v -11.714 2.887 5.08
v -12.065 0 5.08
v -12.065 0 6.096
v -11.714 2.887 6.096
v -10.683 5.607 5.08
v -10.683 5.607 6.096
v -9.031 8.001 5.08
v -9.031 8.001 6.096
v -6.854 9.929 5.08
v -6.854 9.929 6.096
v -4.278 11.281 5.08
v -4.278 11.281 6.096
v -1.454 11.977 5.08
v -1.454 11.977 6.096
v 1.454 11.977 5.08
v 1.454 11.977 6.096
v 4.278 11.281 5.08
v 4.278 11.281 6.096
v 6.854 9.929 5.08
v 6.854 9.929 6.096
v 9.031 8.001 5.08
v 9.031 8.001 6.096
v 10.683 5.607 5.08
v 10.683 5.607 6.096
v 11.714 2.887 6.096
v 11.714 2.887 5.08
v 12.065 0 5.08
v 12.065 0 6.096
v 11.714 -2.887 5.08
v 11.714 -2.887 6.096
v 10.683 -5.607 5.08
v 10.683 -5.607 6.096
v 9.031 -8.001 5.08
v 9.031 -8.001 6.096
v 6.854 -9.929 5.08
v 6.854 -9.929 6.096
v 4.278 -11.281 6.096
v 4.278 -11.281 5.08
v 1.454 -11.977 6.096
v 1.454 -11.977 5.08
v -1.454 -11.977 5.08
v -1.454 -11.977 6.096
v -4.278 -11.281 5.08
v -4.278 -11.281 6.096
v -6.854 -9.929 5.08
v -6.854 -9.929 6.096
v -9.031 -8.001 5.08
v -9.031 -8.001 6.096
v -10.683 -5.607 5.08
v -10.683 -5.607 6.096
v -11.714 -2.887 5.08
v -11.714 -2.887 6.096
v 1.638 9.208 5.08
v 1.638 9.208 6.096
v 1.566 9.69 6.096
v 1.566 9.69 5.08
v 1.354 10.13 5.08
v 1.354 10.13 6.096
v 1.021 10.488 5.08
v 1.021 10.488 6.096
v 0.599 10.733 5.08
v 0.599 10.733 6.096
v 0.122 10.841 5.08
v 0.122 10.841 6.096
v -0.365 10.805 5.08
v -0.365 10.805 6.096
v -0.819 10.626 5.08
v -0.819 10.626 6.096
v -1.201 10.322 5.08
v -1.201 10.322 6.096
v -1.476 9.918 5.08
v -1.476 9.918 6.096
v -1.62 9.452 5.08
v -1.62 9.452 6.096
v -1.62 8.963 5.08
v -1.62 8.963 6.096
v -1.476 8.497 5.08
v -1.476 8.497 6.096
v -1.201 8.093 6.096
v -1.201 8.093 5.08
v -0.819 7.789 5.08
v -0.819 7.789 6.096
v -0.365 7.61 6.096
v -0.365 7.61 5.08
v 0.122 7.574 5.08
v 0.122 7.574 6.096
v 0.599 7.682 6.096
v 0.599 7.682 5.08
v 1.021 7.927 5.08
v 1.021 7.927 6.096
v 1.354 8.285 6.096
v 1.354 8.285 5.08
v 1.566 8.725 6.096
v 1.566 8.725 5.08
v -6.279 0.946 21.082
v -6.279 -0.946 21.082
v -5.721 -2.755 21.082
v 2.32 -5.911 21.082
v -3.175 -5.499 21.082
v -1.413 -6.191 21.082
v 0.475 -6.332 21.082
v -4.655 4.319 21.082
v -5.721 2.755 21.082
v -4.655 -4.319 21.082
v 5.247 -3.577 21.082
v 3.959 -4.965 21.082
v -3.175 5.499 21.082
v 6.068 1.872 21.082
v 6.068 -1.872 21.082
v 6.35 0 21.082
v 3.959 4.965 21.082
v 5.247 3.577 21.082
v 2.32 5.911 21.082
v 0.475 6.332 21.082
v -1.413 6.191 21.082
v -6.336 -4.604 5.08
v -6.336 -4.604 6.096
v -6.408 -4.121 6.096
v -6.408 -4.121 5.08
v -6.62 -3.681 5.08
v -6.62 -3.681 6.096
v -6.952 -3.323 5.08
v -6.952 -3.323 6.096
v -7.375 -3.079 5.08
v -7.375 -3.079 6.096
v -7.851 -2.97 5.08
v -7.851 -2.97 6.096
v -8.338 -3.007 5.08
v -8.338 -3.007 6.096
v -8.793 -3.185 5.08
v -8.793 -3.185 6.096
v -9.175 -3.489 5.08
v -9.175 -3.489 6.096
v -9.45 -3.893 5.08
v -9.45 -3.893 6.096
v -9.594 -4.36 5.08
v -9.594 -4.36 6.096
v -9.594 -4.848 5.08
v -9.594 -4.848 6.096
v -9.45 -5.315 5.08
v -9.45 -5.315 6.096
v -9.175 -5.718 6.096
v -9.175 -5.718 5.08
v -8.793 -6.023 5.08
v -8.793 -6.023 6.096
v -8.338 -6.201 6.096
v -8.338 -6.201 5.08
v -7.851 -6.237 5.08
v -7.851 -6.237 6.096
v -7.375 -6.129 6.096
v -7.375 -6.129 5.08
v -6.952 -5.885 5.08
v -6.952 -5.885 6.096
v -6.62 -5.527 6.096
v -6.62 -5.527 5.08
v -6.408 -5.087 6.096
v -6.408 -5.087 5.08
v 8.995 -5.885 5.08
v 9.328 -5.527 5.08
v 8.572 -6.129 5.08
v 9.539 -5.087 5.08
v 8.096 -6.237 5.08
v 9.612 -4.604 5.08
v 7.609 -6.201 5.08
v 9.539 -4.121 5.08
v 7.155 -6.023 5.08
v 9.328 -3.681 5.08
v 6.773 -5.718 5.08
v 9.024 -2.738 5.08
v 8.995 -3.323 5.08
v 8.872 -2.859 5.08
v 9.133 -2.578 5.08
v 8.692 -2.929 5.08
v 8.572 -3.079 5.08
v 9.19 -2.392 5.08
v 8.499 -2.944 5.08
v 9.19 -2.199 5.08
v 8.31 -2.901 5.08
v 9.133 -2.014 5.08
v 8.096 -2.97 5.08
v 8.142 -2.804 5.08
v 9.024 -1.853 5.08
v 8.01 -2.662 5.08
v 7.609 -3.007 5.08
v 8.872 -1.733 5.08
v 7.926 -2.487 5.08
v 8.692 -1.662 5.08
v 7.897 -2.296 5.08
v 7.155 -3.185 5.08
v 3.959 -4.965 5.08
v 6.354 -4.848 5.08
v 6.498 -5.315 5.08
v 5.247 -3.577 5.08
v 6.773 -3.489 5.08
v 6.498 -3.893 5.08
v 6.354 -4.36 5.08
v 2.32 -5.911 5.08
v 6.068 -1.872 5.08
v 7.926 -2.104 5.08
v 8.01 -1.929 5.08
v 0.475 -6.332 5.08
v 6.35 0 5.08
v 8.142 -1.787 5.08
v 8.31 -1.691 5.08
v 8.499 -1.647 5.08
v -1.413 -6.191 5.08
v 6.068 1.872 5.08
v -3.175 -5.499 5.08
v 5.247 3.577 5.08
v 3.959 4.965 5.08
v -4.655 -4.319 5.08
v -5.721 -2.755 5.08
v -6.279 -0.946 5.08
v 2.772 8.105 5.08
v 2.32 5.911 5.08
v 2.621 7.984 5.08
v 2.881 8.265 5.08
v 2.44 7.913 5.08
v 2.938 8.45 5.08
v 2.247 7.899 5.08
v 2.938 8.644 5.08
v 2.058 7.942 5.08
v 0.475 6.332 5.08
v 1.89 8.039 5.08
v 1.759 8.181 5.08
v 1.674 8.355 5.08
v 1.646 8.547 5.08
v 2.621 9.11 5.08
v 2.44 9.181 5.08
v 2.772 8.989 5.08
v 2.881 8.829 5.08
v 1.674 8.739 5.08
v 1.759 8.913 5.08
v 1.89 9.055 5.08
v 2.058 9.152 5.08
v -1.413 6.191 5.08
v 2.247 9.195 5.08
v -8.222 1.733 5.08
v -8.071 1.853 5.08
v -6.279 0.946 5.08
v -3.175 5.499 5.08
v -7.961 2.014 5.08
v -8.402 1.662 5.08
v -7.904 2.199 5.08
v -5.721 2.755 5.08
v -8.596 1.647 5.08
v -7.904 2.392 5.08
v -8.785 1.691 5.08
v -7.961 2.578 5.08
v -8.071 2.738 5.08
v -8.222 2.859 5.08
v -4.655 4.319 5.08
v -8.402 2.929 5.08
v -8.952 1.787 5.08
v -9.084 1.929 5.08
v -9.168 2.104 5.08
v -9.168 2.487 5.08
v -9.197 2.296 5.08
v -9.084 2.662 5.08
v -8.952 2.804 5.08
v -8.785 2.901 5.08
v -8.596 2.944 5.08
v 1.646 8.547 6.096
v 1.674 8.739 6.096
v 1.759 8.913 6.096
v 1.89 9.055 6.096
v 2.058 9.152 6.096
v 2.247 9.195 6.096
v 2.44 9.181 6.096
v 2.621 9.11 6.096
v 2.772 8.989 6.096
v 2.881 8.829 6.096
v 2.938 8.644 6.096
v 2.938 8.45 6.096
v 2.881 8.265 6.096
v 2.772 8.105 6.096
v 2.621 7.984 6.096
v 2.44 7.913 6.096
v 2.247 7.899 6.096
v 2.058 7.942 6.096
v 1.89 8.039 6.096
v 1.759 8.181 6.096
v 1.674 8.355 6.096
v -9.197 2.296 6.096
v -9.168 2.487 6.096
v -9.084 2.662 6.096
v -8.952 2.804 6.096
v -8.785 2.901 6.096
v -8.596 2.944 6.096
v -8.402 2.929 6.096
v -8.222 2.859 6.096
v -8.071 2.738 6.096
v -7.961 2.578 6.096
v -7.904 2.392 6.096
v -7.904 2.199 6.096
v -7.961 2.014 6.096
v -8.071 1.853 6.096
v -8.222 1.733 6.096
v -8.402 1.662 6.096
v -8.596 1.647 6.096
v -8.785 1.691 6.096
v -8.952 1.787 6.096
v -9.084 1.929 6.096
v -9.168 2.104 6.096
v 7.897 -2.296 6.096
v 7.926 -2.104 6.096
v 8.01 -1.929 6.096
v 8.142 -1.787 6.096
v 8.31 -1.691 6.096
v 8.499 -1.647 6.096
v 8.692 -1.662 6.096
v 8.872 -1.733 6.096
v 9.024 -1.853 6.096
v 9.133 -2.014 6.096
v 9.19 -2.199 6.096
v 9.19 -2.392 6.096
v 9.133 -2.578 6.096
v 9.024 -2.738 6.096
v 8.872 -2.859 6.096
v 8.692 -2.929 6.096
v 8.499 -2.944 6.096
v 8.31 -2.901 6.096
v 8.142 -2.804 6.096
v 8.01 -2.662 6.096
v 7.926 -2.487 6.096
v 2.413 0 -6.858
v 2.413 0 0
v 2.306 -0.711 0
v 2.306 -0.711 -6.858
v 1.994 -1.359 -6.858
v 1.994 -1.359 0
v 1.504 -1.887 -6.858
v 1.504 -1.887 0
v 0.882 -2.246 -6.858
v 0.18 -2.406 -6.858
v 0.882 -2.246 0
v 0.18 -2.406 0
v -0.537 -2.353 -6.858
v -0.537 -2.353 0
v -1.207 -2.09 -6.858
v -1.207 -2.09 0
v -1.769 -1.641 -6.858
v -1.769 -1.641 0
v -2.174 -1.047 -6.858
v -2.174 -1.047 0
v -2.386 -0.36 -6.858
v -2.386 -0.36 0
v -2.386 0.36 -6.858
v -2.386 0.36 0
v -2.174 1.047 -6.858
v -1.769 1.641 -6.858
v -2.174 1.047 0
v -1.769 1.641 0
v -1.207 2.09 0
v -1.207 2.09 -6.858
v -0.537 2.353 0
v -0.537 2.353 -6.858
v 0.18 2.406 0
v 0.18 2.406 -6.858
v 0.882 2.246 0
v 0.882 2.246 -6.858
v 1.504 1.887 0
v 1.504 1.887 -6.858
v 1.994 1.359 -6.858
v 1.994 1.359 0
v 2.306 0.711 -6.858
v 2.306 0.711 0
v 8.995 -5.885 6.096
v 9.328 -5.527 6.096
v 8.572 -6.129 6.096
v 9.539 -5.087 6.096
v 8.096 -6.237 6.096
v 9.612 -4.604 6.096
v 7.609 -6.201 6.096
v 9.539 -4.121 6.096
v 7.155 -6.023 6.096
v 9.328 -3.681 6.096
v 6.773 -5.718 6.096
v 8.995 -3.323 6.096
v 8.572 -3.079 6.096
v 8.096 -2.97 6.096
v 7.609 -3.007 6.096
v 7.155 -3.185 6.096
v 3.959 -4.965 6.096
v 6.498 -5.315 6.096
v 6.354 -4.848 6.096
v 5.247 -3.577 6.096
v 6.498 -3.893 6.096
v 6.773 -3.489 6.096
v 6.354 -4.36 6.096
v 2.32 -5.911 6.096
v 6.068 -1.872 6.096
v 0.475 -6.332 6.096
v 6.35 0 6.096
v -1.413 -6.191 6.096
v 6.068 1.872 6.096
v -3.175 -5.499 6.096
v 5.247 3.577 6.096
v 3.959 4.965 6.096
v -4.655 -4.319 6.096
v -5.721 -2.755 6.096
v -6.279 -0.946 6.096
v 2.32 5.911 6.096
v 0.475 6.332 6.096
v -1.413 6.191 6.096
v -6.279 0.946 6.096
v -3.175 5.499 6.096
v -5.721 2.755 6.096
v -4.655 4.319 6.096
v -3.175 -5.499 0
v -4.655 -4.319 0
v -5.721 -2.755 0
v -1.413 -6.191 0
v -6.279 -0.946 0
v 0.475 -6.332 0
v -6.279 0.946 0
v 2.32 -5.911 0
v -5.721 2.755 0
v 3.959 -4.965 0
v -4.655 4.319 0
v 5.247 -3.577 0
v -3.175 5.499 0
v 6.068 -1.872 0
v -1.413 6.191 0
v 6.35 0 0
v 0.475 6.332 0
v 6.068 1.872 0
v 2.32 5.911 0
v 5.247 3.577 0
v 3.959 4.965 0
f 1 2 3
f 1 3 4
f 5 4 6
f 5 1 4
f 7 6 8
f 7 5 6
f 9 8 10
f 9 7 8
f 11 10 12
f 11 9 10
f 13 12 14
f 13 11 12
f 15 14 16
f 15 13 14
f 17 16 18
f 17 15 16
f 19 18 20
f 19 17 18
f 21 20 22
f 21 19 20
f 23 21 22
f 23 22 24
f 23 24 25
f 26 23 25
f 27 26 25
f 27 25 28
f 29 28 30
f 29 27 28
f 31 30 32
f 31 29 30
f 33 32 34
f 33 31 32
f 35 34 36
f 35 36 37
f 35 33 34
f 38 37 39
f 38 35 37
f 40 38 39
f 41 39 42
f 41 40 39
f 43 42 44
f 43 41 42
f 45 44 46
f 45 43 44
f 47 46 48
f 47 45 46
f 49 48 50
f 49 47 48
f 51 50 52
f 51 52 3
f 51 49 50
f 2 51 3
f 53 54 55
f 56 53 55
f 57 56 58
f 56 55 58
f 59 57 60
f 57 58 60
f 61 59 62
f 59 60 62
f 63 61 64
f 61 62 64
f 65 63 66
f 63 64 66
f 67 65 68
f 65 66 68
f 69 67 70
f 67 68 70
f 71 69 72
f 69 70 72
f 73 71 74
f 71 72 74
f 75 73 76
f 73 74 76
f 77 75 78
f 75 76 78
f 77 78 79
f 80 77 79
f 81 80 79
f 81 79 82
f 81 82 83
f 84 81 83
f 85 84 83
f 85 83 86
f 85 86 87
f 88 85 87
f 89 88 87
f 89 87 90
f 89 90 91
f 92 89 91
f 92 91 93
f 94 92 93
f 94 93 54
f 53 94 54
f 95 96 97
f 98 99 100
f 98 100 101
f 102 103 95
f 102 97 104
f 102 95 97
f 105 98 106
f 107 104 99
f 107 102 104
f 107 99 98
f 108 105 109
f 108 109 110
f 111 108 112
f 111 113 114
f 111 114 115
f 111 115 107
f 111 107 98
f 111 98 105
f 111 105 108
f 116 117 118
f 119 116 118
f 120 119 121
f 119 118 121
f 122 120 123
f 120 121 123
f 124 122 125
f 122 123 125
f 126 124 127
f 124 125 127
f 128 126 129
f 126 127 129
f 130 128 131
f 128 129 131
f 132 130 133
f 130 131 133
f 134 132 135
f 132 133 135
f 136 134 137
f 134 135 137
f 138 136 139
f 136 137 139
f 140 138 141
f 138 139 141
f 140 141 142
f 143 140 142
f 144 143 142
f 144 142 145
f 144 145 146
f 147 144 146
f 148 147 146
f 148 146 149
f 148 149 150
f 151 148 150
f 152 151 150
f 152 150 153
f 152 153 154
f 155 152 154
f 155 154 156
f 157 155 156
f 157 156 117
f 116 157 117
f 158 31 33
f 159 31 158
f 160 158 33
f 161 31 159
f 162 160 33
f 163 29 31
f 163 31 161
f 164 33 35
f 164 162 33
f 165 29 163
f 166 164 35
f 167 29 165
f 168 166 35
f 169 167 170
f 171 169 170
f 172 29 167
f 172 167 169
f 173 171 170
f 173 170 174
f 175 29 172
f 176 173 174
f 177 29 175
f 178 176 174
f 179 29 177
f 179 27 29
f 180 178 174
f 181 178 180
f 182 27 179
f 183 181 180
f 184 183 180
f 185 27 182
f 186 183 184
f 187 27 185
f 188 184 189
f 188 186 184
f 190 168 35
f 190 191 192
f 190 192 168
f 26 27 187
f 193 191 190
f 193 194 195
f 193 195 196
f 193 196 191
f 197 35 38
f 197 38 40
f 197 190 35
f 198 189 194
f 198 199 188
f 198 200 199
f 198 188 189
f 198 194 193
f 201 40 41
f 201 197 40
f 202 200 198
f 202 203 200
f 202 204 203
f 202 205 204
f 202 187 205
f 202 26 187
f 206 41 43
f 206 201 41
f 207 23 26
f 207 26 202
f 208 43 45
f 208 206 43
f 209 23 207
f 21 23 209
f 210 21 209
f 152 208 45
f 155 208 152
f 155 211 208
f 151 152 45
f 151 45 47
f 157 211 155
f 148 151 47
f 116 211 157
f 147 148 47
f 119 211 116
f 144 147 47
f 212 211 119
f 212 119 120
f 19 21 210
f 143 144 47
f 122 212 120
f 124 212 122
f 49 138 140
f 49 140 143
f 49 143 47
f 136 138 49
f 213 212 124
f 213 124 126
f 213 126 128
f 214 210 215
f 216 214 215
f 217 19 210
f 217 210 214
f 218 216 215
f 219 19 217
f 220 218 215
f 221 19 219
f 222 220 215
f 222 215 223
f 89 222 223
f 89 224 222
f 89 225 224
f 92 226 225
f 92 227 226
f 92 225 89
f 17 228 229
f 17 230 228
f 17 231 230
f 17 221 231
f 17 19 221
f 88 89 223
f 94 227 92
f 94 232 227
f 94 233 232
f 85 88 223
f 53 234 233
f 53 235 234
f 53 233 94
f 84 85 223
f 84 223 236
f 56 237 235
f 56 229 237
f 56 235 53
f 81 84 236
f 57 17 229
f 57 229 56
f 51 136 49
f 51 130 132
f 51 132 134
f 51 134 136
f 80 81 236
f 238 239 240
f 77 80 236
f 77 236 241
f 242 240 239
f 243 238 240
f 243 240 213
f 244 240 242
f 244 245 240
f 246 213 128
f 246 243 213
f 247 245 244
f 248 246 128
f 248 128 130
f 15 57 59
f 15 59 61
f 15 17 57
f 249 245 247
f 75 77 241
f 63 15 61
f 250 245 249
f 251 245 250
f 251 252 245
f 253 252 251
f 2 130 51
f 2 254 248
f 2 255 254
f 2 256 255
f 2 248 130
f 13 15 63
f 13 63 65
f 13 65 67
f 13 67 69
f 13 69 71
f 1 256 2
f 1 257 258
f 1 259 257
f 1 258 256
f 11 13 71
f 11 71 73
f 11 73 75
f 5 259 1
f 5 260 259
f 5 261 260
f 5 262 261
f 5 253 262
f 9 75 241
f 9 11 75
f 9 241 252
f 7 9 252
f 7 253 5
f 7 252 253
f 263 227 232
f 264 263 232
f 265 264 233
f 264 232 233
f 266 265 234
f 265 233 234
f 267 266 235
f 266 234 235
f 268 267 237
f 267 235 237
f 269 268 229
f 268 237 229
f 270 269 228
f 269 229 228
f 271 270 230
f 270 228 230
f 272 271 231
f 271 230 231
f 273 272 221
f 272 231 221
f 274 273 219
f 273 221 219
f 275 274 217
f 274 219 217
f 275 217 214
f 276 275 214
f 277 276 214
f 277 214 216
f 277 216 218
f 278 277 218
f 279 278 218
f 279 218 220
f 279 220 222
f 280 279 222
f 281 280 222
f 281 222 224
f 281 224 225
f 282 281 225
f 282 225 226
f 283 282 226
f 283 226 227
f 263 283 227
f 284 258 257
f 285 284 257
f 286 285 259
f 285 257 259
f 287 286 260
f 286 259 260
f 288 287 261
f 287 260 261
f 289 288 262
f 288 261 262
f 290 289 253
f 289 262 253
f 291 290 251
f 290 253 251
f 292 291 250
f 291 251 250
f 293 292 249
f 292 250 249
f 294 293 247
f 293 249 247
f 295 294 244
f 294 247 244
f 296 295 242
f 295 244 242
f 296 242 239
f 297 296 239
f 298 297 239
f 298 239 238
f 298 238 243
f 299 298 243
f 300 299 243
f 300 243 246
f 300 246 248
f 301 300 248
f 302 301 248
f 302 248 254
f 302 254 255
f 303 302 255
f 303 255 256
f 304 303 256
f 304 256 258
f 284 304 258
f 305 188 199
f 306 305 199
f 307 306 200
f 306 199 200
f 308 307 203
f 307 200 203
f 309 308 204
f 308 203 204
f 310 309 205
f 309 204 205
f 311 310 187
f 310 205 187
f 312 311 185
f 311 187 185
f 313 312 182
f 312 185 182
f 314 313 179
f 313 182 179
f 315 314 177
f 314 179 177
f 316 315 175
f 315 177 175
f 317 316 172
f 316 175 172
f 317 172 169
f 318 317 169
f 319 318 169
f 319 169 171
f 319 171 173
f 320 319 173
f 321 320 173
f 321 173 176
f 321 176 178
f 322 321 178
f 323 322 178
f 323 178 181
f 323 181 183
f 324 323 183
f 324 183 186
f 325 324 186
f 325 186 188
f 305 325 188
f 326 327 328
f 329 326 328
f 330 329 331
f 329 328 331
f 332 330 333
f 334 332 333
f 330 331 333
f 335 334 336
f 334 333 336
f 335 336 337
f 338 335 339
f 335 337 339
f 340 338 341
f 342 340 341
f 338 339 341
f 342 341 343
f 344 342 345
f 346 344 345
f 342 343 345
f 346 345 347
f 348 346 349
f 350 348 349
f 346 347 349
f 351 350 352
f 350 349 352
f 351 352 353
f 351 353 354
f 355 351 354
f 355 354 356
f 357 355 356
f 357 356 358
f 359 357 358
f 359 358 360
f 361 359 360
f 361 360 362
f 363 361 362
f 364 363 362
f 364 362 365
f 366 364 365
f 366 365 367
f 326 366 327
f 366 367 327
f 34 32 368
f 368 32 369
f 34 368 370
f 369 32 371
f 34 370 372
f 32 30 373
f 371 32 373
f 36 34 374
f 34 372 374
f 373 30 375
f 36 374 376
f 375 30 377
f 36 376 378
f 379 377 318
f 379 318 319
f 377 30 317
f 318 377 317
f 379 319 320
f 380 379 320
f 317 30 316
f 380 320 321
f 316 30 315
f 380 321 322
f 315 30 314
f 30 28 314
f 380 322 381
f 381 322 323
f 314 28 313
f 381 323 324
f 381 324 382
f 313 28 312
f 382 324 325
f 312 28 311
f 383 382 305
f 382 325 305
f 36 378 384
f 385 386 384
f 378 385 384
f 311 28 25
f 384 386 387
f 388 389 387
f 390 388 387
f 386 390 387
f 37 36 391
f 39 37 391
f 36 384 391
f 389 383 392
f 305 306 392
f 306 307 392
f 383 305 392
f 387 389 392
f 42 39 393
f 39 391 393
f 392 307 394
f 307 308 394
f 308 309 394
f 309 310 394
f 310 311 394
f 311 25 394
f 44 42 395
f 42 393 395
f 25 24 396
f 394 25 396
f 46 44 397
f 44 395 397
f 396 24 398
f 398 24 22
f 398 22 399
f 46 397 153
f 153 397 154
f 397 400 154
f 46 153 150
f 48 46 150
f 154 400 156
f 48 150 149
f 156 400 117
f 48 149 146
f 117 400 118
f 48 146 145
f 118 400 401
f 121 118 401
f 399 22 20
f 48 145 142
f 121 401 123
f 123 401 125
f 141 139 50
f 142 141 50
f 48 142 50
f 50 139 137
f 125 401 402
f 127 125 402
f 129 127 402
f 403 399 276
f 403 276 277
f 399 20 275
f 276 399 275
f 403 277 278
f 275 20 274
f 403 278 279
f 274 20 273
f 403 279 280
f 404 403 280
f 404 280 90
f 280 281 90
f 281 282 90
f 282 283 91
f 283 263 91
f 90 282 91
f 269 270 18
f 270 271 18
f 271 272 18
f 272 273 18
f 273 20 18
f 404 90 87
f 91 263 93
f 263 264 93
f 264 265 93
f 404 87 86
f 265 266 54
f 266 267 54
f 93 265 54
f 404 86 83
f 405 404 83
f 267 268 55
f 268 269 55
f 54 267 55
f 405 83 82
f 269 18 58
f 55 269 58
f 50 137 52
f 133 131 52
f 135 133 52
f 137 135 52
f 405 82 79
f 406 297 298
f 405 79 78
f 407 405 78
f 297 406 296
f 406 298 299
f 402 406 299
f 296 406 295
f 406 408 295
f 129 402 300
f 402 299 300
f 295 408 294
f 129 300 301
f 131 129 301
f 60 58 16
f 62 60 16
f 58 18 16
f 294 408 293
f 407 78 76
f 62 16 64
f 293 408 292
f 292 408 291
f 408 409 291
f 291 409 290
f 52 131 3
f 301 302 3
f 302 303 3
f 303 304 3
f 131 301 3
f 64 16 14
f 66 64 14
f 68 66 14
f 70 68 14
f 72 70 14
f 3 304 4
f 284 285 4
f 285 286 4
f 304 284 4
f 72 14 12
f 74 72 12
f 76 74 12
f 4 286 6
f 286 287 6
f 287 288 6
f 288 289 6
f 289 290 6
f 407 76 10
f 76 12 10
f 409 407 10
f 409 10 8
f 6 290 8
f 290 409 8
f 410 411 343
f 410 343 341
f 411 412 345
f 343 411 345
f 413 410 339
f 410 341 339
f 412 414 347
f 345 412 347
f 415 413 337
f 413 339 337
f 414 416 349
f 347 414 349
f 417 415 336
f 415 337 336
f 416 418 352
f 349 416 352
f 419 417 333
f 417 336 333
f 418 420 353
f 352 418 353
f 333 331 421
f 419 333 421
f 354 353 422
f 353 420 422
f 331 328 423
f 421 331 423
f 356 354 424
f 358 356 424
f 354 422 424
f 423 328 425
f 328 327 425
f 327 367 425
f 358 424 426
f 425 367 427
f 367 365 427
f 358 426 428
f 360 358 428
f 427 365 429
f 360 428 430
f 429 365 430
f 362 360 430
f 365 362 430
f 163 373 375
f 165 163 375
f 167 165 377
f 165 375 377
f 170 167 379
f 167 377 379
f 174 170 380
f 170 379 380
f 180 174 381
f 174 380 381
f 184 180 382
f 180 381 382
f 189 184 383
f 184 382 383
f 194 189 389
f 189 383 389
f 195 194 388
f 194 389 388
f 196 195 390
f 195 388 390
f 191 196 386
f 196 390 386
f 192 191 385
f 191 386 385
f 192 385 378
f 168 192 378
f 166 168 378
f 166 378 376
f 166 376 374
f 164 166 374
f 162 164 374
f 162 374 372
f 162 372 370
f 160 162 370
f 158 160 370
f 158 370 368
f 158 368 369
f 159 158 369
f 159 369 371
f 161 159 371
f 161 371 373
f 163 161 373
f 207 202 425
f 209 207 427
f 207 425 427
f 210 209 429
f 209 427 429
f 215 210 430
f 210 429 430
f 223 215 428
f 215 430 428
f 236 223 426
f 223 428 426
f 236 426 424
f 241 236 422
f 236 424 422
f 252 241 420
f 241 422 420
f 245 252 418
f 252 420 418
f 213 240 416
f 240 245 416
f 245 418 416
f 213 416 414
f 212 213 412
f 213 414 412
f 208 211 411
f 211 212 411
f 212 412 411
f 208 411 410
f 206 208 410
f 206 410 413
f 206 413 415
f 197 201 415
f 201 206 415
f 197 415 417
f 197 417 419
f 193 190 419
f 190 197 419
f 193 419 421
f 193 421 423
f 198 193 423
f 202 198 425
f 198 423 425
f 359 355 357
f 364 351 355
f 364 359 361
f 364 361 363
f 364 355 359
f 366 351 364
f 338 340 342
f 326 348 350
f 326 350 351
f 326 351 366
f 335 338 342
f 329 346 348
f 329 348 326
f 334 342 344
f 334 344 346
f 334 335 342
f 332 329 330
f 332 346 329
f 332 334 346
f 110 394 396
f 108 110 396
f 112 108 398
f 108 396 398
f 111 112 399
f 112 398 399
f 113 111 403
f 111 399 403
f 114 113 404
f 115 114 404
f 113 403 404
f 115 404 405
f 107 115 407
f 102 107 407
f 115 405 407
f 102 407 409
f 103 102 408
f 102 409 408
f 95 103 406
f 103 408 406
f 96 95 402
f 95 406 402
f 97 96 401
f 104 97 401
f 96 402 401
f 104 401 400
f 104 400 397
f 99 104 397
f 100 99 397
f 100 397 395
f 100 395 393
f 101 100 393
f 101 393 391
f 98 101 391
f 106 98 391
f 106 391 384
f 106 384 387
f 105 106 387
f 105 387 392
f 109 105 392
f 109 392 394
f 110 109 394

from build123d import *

# Parameters (mm, degrees)
SKETCH1_R          = 6.35
EXTRUDE1_DEPTH     = 21.082
SKETCH2_R          = 2.413
EXTRUDE2_DEPTH     = 6.858
SKETCH3_R          = 12.065
EXTRUDE3_DEPTH     = 1.016
SKETCH4_R          = 1.6383
CUT_EXTRUDE1_DEPTH = 23.709219405
SKETCH6_R          = 0.65
CUT_EXTRUDE2_DEPTH = 24.392145135


with BuildPart() as part:
    # Sketch1 → Extrude1 (new body)
    with BuildSketch(Plane.XY):
        Circle(SKETCH1_R)
    extrude(amount=EXTRUDE1_DEPTH)

    # Sketch2 → Extrude2 (add)
    with BuildSketch(Plane(origin=(0, 0, 0), x_dir=(-1, 0, 0), z_dir=(0, 0, -1))):
        with Locations(Location((0, 0, 0), (0, 0, 180))):
            Circle(SKETCH2_R)
    extrude(amount=EXTRUDE2_DEPTH)

    # Sketch3 → Extrude3 (add)
    with BuildSketch(Plane(origin=(0, 0, 5.08), x_dir=(-1, 0, 0), z_dir=(0, 0, -1))):
        Circle(SKETCH3_R)
    extrude(amount=-EXTRUDE3_DEPTH)

    # Sketch4 → Cut-Extrude1 (cut, through all)
    with BuildSketch(Plane.XY.offset(6.096)):
        with Locations((0, 9.2075)):
            Circle(SKETCH4_R)
        with Locations((7.973928905, -4.60375)):
            Circle(SKETCH4_R)
        with Locations((-7.973928905, -4.60375)):
            Circle(SKETCH4_R)
    extrude(amount=-CUT_EXTRUDE1_DEPTH, mode=Mode.SUBTRACT)

    # Sketch6 → Cut-Extrude2 (cut, through all)
    with BuildSketch(Plane(origin=(0, 0, 5.08), x_dir=(-1, 0, 0), z_dir=(0, 0, -1))):
        with Locations((-8.547087459, -2.295603618)):
            Circle(SKETCH6_R)
        with Locations((-2.295603618, 8.547087459)):
            Circle(SKETCH6_R)
        with Locations((8.547087459, 2.295603618)):
            Circle(SKETCH6_R)
    extrude(amount=-CUT_EXTRUDE2_DEPTH, mode=Mode.SUBTRACT)


solid = part.part
